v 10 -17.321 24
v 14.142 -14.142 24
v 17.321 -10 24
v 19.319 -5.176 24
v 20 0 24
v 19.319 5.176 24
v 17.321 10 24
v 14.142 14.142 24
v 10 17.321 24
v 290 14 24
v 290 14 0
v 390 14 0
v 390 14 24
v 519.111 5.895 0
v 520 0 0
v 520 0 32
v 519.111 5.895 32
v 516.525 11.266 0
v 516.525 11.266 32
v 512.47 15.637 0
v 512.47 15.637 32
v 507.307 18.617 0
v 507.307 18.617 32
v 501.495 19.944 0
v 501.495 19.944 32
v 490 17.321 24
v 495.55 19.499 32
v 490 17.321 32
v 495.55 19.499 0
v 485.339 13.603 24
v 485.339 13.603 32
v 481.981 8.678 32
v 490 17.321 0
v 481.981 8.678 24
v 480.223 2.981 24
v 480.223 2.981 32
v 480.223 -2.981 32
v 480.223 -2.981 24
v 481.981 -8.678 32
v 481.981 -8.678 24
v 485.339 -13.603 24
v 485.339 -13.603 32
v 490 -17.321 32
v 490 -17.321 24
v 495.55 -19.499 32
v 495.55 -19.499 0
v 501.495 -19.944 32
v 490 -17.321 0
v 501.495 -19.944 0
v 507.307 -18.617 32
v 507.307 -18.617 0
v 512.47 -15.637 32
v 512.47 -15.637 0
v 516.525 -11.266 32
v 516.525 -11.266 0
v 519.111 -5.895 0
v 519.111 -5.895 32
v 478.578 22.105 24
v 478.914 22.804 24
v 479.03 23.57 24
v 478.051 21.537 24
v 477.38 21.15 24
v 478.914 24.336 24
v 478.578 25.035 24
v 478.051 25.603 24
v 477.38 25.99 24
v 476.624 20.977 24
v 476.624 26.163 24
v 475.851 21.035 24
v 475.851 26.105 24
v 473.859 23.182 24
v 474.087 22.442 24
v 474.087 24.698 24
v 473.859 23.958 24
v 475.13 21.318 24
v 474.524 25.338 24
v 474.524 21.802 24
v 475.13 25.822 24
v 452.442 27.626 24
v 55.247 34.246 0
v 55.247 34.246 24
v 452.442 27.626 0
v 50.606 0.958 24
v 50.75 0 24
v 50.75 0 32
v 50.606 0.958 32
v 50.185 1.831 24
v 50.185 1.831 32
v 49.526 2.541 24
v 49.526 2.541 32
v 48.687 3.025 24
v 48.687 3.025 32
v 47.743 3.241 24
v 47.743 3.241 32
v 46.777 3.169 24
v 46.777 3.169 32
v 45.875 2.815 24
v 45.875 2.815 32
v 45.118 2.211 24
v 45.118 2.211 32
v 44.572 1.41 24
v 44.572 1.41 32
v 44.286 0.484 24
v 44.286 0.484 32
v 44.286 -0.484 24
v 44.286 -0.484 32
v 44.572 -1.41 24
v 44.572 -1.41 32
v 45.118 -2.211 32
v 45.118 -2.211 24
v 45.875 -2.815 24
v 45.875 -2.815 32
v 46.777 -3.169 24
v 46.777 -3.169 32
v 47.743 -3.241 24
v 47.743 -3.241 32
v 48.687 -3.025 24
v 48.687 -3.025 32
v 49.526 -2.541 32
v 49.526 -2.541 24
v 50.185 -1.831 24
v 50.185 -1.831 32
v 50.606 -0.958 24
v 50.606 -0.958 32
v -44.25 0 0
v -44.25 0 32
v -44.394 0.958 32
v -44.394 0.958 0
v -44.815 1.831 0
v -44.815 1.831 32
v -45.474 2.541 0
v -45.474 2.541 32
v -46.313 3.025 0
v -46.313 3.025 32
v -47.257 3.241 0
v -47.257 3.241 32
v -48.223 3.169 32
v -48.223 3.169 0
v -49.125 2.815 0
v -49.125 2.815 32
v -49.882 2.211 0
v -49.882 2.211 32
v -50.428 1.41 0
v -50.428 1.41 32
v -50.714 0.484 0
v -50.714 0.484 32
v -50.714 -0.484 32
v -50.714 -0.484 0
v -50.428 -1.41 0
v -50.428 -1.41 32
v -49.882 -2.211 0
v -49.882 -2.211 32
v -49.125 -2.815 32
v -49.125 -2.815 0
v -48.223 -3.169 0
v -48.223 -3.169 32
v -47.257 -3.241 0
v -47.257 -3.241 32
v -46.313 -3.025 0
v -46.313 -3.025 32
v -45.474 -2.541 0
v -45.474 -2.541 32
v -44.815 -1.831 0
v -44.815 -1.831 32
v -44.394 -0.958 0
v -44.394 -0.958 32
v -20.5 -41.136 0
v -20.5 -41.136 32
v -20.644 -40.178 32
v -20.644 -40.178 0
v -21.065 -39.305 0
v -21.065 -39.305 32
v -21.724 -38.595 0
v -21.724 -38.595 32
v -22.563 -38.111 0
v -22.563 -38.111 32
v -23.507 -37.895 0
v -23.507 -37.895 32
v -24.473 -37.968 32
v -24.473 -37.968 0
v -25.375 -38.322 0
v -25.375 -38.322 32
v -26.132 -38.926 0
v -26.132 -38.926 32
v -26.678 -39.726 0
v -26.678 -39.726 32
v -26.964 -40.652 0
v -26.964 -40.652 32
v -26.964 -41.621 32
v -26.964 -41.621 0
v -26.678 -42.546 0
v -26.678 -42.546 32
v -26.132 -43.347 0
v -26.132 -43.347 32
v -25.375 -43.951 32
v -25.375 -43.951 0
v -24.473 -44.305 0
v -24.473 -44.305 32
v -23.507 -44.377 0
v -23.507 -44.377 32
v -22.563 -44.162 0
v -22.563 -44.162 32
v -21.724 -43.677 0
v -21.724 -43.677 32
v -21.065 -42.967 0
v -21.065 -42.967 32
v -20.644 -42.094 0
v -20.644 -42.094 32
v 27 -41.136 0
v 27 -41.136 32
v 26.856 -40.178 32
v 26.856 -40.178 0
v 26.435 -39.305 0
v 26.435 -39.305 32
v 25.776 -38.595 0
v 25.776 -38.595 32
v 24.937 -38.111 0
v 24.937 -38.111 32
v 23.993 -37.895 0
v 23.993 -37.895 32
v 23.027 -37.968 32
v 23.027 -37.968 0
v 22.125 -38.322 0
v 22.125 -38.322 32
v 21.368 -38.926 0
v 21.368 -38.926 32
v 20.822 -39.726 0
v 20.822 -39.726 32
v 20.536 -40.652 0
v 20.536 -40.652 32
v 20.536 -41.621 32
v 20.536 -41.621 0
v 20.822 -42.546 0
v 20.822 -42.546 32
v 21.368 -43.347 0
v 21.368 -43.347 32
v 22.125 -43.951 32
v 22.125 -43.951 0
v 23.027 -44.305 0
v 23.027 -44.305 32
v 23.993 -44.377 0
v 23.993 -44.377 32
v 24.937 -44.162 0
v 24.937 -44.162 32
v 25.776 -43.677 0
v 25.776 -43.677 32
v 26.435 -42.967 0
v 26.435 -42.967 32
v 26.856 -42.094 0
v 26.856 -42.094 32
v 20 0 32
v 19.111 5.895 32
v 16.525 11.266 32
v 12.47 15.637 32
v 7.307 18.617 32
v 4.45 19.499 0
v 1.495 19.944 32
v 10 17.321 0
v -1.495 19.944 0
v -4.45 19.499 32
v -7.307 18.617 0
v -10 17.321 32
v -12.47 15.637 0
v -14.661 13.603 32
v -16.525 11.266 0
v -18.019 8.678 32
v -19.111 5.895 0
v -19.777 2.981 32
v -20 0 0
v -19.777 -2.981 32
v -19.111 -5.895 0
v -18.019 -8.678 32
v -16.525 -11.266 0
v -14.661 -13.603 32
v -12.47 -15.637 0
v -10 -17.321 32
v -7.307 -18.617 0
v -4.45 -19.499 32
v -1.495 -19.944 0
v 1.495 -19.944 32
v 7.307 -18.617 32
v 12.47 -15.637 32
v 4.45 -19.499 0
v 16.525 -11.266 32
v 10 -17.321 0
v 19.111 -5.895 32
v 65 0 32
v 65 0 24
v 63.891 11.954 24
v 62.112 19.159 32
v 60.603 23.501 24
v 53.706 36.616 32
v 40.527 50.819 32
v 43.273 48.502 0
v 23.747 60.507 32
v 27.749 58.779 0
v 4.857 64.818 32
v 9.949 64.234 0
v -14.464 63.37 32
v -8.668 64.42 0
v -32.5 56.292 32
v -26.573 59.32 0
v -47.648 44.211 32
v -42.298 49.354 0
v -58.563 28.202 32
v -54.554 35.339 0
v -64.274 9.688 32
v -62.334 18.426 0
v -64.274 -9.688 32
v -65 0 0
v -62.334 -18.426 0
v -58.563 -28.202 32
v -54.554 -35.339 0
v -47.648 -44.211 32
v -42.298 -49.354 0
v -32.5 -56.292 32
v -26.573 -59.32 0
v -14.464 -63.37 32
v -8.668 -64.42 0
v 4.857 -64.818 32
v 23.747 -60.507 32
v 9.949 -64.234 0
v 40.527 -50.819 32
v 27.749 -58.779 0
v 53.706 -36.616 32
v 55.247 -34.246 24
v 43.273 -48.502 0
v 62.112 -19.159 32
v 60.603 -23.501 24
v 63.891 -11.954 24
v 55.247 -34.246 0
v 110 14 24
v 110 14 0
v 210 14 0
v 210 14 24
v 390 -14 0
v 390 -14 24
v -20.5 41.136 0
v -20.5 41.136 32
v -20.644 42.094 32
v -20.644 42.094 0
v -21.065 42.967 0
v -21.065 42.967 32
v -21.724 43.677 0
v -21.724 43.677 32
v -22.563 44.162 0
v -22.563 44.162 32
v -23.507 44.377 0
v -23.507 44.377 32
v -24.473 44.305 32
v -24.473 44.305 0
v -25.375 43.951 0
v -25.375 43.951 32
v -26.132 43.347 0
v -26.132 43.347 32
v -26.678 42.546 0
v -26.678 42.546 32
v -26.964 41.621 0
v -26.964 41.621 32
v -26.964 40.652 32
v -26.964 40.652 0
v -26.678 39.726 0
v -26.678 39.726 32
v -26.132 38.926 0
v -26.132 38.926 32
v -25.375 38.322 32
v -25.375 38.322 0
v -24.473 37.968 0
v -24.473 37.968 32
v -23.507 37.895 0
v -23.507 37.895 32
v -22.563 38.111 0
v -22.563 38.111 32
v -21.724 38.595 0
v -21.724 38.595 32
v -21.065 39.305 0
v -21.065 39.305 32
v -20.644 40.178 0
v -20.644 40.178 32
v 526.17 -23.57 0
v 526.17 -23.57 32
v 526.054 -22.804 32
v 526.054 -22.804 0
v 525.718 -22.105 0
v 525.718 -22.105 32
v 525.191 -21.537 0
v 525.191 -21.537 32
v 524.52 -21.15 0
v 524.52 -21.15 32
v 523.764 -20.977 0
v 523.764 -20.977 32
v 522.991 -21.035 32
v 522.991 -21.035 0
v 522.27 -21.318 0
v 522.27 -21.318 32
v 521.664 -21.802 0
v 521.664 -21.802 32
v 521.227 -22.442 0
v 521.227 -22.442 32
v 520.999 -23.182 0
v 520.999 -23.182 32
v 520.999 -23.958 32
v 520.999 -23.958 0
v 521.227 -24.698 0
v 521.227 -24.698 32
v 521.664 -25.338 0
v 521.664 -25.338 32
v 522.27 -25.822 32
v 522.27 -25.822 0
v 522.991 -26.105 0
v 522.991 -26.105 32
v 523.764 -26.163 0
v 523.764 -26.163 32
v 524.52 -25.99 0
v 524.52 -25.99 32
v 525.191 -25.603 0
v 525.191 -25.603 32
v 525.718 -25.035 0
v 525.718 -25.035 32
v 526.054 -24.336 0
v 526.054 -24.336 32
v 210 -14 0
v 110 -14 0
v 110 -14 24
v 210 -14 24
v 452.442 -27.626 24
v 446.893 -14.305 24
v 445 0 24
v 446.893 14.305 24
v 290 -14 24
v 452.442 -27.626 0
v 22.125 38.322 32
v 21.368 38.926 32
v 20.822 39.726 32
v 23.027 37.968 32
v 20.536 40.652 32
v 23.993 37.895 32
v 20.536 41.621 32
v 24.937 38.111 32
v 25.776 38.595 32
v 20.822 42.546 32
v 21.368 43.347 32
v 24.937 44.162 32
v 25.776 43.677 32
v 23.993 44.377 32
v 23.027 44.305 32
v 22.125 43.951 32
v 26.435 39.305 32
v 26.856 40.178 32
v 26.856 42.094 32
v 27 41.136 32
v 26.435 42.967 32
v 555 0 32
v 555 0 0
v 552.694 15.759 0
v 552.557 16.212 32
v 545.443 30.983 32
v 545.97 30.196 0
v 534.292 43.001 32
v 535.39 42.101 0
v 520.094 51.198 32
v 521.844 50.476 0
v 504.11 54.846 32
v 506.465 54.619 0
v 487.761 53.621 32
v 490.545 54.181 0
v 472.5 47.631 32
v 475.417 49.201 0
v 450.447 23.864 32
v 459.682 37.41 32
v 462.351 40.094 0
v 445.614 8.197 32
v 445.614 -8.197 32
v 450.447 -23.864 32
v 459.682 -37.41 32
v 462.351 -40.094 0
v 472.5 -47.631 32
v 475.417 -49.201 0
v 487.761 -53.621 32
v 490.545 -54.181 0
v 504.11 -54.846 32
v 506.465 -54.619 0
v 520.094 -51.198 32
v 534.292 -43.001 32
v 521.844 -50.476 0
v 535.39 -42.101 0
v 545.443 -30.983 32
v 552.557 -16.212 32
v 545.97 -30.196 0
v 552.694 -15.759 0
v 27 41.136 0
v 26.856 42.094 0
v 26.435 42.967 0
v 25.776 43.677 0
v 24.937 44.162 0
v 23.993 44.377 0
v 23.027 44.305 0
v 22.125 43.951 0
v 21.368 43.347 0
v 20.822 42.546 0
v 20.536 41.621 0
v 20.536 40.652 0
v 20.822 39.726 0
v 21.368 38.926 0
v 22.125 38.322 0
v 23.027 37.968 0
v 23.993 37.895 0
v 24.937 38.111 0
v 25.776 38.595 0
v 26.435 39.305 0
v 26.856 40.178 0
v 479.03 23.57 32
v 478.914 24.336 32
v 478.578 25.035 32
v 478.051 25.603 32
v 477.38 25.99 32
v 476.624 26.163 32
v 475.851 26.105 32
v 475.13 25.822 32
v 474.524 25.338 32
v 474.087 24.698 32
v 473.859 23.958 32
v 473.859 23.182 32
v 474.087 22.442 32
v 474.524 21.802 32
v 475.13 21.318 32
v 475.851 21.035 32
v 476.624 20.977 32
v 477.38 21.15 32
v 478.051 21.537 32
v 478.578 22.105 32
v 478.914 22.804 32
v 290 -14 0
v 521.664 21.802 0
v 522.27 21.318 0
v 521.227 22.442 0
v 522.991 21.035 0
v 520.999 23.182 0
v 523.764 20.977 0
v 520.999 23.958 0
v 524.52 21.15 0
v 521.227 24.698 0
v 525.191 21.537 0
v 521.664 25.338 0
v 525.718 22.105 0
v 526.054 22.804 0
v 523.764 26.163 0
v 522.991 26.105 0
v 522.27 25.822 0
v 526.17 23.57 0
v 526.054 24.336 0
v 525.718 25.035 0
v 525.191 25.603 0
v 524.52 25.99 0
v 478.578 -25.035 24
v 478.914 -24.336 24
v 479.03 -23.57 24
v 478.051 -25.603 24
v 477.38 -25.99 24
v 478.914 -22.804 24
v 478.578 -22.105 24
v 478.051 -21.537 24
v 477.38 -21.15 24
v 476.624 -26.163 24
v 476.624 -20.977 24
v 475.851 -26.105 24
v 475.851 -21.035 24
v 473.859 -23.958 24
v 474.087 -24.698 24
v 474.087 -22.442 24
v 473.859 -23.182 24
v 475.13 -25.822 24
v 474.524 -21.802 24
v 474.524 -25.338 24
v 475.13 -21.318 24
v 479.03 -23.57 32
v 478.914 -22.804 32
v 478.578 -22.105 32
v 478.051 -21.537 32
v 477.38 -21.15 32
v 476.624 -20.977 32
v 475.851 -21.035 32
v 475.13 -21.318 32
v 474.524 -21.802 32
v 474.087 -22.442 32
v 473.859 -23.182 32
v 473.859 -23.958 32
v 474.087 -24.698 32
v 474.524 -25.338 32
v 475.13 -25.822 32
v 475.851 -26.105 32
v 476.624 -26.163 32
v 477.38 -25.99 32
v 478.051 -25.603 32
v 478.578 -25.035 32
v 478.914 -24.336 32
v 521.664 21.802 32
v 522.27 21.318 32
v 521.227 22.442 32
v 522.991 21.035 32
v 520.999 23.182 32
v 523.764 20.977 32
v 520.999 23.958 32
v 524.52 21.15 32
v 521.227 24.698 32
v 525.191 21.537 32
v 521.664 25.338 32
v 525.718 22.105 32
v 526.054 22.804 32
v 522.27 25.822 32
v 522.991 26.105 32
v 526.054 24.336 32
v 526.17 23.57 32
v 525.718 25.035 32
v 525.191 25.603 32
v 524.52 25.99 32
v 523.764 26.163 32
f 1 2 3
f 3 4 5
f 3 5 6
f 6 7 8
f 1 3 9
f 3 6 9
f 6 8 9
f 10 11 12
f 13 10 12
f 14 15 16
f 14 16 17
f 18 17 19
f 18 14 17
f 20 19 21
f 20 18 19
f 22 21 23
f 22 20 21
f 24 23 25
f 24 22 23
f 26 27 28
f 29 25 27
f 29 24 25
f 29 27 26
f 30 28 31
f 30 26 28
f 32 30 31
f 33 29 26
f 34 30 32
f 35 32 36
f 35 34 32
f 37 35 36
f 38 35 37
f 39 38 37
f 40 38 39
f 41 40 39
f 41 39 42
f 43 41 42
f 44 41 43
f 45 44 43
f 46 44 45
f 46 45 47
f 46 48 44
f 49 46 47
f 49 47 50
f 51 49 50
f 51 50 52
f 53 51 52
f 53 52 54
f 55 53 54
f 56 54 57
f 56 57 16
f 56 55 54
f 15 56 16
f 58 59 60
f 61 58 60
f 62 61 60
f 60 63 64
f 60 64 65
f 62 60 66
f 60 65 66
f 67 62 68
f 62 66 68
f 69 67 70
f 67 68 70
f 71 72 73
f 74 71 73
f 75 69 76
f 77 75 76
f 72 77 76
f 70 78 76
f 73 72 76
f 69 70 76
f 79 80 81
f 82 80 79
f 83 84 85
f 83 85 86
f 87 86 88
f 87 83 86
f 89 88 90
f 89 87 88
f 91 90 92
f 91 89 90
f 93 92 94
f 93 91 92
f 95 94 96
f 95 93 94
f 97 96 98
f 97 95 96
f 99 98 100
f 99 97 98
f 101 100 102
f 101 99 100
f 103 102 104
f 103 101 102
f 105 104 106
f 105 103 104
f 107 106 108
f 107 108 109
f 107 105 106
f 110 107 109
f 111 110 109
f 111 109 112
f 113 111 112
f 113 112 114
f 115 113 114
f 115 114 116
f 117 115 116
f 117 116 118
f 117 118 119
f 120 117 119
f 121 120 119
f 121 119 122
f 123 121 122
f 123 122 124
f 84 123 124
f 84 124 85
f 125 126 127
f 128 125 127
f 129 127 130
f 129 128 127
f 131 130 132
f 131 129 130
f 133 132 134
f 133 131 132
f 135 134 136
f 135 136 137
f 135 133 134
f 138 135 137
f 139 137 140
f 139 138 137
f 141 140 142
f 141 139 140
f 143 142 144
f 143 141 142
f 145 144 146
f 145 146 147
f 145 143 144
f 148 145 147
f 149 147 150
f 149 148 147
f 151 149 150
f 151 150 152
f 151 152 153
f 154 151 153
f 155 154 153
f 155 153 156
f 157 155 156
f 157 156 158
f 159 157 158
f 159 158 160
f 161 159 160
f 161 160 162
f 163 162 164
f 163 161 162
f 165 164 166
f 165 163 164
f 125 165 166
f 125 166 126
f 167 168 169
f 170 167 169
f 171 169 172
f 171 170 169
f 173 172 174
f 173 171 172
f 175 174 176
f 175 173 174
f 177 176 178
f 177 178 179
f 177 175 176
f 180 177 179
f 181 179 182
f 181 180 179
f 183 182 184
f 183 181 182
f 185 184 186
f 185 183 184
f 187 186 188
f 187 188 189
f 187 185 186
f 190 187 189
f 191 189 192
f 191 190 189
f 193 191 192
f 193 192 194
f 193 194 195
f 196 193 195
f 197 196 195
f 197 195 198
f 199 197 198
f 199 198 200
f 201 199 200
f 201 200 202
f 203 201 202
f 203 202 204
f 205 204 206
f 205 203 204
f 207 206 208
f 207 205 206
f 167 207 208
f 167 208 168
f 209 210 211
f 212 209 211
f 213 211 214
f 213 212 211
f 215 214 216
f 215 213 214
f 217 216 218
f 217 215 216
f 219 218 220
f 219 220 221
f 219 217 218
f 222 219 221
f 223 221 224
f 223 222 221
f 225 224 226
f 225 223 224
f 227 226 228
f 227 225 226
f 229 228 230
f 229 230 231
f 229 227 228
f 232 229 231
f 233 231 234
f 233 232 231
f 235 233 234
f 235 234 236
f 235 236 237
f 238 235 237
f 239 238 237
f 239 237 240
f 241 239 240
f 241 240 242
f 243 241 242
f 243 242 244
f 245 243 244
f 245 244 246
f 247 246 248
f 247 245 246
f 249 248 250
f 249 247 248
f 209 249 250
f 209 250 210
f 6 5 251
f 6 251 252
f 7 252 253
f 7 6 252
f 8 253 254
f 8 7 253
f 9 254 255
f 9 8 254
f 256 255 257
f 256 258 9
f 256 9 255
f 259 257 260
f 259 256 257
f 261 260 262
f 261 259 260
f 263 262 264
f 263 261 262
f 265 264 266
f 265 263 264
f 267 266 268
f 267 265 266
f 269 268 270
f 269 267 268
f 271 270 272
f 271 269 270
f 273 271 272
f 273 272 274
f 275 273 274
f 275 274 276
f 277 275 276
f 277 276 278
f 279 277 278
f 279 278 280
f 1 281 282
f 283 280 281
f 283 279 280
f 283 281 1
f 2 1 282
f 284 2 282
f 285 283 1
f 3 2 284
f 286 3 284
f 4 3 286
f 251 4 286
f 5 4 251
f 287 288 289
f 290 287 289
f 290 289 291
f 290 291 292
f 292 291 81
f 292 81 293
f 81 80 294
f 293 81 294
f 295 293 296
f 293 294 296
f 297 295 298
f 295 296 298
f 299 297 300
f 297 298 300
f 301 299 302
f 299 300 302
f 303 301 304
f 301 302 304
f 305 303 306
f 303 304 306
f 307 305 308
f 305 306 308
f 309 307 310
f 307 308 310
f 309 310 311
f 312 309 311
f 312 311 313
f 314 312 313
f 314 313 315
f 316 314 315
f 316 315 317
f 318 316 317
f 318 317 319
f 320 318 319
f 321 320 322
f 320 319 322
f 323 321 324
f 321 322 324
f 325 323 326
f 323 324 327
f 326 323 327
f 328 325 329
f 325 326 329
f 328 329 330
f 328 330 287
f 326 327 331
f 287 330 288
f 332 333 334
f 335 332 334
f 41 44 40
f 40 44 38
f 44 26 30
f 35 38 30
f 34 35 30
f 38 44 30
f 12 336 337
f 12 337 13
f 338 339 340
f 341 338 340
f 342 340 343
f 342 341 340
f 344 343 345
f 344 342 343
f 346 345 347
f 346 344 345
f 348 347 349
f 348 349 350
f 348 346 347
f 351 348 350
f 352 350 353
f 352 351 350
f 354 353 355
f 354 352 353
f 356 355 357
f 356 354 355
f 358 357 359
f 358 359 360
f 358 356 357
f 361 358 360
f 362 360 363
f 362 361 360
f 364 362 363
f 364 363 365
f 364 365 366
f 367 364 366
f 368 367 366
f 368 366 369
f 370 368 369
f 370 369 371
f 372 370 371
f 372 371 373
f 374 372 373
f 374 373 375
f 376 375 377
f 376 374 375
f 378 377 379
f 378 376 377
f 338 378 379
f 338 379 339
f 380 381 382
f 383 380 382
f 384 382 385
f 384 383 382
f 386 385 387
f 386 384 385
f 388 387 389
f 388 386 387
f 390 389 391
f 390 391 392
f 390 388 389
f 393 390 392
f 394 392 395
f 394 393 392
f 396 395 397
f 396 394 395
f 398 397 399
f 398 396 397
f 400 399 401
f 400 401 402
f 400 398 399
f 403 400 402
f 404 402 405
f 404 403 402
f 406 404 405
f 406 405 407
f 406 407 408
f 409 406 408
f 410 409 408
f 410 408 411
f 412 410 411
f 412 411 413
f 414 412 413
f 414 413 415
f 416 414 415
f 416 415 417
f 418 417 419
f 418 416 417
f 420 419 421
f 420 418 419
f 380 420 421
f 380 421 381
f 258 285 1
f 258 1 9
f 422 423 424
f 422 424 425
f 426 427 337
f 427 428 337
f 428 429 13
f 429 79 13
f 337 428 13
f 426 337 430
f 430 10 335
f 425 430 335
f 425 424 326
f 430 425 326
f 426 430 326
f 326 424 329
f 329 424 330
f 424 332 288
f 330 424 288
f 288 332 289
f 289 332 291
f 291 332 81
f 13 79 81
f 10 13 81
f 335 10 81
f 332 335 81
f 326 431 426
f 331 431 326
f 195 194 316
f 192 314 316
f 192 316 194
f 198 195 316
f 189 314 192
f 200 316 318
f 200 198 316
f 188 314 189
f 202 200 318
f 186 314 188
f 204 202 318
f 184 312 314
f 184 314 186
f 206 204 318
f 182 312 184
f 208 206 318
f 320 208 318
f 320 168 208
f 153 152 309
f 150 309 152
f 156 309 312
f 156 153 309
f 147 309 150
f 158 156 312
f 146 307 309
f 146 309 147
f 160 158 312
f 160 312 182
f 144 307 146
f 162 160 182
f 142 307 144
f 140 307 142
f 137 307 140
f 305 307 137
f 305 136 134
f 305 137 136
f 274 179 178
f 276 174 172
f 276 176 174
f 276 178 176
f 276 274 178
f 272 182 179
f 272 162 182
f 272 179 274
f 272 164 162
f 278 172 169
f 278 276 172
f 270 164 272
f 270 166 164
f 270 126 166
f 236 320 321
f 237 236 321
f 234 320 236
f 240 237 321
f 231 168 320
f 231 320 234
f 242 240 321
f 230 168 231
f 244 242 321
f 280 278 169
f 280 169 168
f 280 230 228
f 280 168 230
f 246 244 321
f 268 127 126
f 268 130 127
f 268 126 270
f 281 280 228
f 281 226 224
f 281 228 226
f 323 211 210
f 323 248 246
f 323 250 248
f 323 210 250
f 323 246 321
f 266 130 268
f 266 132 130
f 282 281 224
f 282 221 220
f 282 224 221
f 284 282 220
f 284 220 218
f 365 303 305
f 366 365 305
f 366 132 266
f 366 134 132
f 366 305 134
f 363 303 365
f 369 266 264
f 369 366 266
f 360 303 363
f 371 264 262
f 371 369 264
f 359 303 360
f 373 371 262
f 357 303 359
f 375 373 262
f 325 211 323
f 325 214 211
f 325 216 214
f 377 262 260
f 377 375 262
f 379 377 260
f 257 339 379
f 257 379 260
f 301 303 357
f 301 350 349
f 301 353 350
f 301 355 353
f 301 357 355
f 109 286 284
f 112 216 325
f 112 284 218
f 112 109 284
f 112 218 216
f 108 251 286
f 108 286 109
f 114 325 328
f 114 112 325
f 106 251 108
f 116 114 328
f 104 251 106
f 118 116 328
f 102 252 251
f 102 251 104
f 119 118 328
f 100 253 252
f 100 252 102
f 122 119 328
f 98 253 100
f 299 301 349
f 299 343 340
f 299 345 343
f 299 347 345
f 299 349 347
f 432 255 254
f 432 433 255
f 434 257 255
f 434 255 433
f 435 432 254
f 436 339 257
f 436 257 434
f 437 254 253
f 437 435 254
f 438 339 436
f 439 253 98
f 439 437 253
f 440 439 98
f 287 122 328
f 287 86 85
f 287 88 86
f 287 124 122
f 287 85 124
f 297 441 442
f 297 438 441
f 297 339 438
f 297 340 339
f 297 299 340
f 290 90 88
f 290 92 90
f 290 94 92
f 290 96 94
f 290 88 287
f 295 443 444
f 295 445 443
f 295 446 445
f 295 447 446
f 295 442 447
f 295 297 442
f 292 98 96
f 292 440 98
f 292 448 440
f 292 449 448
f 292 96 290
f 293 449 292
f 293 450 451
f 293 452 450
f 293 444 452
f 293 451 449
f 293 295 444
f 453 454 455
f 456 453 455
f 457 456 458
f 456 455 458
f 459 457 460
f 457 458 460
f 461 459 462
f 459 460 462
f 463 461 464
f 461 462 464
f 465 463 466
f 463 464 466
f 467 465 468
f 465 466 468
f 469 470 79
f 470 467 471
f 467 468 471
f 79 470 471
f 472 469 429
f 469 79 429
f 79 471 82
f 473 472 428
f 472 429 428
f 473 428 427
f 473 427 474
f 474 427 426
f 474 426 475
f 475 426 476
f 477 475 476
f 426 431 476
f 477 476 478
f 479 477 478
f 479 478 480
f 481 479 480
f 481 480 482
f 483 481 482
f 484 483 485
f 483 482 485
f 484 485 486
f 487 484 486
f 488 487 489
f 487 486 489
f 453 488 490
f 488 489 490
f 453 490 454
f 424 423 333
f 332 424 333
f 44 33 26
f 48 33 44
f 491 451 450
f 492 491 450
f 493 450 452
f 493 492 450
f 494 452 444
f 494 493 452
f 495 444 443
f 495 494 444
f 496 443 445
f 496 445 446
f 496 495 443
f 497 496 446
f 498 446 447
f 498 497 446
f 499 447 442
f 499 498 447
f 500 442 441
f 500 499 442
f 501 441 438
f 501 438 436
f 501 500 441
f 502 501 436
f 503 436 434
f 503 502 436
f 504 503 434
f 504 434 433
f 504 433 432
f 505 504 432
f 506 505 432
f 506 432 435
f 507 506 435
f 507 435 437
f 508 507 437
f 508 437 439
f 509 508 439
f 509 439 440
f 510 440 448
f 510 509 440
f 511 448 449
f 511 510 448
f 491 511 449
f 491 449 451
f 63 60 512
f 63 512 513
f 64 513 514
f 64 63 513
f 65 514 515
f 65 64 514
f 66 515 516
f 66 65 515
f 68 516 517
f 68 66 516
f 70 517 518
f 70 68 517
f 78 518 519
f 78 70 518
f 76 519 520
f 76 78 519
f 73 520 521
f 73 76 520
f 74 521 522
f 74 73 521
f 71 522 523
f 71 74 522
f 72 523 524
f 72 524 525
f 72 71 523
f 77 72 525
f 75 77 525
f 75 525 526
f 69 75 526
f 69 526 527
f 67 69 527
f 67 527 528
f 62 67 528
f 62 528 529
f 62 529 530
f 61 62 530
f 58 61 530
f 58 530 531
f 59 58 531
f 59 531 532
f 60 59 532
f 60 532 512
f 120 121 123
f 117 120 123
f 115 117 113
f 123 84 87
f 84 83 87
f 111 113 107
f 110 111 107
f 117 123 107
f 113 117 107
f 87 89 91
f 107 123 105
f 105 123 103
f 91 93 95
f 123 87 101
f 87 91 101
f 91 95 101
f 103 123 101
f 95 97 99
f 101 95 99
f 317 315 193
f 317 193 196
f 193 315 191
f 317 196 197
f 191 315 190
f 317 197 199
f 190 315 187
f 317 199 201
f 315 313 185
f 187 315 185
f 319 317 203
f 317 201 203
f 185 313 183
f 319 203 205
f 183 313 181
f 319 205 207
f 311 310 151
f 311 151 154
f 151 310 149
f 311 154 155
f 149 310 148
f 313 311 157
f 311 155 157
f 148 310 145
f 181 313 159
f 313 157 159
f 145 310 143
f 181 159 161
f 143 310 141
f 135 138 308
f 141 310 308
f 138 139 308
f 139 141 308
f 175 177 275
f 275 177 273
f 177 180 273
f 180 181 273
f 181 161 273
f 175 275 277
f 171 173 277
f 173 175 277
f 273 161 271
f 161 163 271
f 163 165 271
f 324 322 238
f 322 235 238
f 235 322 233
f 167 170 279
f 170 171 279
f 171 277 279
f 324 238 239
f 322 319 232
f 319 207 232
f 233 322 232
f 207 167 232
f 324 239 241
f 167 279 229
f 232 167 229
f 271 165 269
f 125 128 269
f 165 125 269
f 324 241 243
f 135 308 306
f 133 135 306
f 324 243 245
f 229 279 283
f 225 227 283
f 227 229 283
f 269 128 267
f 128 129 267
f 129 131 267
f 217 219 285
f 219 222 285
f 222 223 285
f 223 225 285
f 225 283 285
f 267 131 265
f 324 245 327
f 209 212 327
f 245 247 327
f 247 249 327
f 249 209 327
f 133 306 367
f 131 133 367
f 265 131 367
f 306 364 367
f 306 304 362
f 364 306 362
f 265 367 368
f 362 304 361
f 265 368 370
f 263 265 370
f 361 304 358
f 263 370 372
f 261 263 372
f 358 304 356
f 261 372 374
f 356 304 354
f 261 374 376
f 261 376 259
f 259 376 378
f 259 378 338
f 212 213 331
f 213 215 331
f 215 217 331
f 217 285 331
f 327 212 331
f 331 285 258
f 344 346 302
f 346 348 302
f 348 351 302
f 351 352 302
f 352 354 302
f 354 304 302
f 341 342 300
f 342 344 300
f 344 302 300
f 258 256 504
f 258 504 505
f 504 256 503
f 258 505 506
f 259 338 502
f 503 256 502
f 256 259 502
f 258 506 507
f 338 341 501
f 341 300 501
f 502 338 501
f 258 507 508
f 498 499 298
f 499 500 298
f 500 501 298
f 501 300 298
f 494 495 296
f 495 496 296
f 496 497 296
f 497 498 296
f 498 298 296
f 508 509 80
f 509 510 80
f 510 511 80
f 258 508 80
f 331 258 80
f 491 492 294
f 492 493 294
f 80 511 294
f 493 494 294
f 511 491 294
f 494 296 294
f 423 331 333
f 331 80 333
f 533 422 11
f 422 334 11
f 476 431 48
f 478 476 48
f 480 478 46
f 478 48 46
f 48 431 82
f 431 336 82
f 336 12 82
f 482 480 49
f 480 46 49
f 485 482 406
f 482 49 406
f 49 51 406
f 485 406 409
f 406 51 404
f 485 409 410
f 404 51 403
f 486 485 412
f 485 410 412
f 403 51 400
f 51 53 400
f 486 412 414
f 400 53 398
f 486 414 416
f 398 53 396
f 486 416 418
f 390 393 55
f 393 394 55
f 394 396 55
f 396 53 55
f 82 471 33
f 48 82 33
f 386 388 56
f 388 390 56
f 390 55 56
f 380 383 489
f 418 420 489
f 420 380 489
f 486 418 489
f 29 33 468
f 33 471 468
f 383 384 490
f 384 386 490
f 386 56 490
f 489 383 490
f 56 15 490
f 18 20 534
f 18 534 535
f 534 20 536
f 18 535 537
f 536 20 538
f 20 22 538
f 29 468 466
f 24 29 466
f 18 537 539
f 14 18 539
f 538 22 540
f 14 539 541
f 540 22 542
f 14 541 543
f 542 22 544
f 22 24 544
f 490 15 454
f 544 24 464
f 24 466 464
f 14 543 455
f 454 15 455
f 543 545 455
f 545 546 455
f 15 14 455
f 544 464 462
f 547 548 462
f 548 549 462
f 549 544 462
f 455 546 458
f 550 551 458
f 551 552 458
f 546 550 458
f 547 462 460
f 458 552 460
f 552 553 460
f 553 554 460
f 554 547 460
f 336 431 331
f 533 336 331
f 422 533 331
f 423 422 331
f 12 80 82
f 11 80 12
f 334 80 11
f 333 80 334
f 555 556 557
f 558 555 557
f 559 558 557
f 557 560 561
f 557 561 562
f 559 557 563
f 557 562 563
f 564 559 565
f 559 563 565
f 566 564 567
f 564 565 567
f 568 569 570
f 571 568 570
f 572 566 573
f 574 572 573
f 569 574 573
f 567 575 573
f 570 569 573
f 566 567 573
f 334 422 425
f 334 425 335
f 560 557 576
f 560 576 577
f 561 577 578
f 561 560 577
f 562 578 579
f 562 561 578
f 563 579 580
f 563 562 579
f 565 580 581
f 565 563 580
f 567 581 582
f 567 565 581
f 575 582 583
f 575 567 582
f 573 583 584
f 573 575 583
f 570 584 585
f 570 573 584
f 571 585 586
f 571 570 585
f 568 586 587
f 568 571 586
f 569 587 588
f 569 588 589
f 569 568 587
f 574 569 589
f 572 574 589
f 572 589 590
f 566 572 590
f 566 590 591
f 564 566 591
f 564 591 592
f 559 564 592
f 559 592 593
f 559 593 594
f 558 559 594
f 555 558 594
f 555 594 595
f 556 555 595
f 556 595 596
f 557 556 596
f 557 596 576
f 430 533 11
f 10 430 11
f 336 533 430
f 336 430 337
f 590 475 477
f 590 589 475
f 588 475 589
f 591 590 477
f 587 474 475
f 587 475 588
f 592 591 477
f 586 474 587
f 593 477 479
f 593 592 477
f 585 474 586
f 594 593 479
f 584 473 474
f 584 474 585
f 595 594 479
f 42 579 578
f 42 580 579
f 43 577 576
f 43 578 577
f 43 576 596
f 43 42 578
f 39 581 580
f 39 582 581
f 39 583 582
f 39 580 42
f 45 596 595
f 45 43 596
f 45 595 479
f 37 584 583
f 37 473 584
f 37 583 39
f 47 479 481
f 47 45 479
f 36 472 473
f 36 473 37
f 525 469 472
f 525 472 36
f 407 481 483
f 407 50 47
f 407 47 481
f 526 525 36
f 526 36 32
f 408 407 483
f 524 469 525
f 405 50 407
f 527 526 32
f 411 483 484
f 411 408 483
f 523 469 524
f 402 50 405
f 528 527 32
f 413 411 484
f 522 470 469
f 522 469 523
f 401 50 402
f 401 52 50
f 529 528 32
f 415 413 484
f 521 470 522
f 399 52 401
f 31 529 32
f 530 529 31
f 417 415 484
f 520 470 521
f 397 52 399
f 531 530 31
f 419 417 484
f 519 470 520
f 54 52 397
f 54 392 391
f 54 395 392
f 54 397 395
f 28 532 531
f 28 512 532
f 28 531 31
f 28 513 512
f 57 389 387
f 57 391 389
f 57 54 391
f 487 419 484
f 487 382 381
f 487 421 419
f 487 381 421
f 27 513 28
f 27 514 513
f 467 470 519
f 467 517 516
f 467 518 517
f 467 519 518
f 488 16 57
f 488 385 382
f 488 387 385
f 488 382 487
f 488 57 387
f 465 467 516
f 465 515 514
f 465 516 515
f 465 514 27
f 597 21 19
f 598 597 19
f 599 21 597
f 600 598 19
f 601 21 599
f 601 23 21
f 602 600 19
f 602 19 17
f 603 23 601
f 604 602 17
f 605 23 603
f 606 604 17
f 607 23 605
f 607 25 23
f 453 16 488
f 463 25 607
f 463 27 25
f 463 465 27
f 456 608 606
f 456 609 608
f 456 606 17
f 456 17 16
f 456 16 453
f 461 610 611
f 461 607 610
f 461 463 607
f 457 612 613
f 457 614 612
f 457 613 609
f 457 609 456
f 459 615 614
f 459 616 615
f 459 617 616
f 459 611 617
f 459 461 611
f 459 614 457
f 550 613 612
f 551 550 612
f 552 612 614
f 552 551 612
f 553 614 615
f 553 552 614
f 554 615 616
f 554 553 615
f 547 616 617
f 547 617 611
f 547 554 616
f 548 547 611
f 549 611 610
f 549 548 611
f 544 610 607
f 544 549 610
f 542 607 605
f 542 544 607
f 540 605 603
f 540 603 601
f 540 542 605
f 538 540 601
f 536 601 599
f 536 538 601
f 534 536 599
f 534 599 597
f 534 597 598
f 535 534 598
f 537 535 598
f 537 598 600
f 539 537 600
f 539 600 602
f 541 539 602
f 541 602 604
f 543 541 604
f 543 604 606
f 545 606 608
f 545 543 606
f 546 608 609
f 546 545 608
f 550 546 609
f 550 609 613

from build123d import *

# Parameters (mm, degrees)
SKETCH1_R           = 65
SKETCH1_R_2         = 20
SKETCH1_R_3         = 3.25
BOSS_EXTRUDE1_DEPTH = 32
SKETCH2_R           = 55
SKETCH2_R_2         = 20
SKETCH2_R_3         = 2.6
BOSS_EXTRUDE2_DEPTH = 32
SKETCH3_W           = 100
SKETCH3_H           = 28
BOSS_EXTRUDE3_DEPTH = 24


with BuildPart() as part:
    # Sketch1 → Boss-Extrude1 (new body)
    with BuildSketch(Plane.XY):
        Circle(SKETCH1_R)
        Circle(SKETCH1_R_2, mode=Mode.SUBTRACT)
        with Locations((47.5, 0)):
            Circle(SKETCH1_R_3, mode=Mode.SUBTRACT)
        with Locations((23.75, 41.13620668)):
            Circle(SKETCH1_R_3, mode=Mode.SUBTRACT)
        with Locations((-23.75, 41.13620668)):
            Circle(SKETCH1_R_3, mode=Mode.SUBTRACT)
        with Locations((-47.5, 0)):
            Circle(SKETCH1_R_3, mode=Mode.SUBTRACT)
        with Locations((-23.75, -41.13620668)):
            Circle(SKETCH1_R_3, mode=Mode.SUBTRACT)
        with Locations((23.75, -41.13620668)):
            Circle(SKETCH1_R_3, mode=Mode.SUBTRACT)
    extrude(amount=BOSS_EXTRUDE1_DEPTH)



with BuildPart() as body_2:
    # Sketch2 → Boss-Extrude2 (new body)
    with BuildSketch(Plane.XY):
        with Locations((500, 0)):
            Circle(SKETCH2_R)
        with Locations((500, 0)):
            Circle(SKETCH2_R_2, mode=Mode.SUBTRACT)
        with Locations((476.43, -23.57)):
            Circle(SKETCH2_R_3, mode=Mode.SUBTRACT)
        with Locations((476.43, 23.57)):
            Circle(SKETCH2_R_3, mode=Mode.SUBTRACT)
        with Locations((523.57, -23.57)):
            Circle(SKETCH2_R_3, mode=Mode.SUBTRACT)
        with Locations((523.57, 23.57)):
            Circle(SKETCH2_R_3, mode=Mode.SUBTRACT)
    extrude(amount=BOSS_EXTRUDE2_DEPTH)


with BuildPart() as part_1:
    add(part.part)

    add(body_2.part)  # Boss-Extrude3 merges body 2
    # Sketch3 → Boss-Extrude3 (add)
    with BuildSketch(Plane.XY):
        Polygon((10, -35), (10, 35), (490, 27), (490, -27), align=None)
        with Locations((160, 0)):
            Rectangle(SKETCH3_W, SKETCH3_H, mode=Mode.SUBTRACT)
        with Locations((340, 0)):
            Rectangle(SKETCH3_W, SKETCH3_H, mode=Mode.SUBTRACT)
    extrude(amount=BOSS_EXTRUDE3_DEPTH)


solid = part_1.part
